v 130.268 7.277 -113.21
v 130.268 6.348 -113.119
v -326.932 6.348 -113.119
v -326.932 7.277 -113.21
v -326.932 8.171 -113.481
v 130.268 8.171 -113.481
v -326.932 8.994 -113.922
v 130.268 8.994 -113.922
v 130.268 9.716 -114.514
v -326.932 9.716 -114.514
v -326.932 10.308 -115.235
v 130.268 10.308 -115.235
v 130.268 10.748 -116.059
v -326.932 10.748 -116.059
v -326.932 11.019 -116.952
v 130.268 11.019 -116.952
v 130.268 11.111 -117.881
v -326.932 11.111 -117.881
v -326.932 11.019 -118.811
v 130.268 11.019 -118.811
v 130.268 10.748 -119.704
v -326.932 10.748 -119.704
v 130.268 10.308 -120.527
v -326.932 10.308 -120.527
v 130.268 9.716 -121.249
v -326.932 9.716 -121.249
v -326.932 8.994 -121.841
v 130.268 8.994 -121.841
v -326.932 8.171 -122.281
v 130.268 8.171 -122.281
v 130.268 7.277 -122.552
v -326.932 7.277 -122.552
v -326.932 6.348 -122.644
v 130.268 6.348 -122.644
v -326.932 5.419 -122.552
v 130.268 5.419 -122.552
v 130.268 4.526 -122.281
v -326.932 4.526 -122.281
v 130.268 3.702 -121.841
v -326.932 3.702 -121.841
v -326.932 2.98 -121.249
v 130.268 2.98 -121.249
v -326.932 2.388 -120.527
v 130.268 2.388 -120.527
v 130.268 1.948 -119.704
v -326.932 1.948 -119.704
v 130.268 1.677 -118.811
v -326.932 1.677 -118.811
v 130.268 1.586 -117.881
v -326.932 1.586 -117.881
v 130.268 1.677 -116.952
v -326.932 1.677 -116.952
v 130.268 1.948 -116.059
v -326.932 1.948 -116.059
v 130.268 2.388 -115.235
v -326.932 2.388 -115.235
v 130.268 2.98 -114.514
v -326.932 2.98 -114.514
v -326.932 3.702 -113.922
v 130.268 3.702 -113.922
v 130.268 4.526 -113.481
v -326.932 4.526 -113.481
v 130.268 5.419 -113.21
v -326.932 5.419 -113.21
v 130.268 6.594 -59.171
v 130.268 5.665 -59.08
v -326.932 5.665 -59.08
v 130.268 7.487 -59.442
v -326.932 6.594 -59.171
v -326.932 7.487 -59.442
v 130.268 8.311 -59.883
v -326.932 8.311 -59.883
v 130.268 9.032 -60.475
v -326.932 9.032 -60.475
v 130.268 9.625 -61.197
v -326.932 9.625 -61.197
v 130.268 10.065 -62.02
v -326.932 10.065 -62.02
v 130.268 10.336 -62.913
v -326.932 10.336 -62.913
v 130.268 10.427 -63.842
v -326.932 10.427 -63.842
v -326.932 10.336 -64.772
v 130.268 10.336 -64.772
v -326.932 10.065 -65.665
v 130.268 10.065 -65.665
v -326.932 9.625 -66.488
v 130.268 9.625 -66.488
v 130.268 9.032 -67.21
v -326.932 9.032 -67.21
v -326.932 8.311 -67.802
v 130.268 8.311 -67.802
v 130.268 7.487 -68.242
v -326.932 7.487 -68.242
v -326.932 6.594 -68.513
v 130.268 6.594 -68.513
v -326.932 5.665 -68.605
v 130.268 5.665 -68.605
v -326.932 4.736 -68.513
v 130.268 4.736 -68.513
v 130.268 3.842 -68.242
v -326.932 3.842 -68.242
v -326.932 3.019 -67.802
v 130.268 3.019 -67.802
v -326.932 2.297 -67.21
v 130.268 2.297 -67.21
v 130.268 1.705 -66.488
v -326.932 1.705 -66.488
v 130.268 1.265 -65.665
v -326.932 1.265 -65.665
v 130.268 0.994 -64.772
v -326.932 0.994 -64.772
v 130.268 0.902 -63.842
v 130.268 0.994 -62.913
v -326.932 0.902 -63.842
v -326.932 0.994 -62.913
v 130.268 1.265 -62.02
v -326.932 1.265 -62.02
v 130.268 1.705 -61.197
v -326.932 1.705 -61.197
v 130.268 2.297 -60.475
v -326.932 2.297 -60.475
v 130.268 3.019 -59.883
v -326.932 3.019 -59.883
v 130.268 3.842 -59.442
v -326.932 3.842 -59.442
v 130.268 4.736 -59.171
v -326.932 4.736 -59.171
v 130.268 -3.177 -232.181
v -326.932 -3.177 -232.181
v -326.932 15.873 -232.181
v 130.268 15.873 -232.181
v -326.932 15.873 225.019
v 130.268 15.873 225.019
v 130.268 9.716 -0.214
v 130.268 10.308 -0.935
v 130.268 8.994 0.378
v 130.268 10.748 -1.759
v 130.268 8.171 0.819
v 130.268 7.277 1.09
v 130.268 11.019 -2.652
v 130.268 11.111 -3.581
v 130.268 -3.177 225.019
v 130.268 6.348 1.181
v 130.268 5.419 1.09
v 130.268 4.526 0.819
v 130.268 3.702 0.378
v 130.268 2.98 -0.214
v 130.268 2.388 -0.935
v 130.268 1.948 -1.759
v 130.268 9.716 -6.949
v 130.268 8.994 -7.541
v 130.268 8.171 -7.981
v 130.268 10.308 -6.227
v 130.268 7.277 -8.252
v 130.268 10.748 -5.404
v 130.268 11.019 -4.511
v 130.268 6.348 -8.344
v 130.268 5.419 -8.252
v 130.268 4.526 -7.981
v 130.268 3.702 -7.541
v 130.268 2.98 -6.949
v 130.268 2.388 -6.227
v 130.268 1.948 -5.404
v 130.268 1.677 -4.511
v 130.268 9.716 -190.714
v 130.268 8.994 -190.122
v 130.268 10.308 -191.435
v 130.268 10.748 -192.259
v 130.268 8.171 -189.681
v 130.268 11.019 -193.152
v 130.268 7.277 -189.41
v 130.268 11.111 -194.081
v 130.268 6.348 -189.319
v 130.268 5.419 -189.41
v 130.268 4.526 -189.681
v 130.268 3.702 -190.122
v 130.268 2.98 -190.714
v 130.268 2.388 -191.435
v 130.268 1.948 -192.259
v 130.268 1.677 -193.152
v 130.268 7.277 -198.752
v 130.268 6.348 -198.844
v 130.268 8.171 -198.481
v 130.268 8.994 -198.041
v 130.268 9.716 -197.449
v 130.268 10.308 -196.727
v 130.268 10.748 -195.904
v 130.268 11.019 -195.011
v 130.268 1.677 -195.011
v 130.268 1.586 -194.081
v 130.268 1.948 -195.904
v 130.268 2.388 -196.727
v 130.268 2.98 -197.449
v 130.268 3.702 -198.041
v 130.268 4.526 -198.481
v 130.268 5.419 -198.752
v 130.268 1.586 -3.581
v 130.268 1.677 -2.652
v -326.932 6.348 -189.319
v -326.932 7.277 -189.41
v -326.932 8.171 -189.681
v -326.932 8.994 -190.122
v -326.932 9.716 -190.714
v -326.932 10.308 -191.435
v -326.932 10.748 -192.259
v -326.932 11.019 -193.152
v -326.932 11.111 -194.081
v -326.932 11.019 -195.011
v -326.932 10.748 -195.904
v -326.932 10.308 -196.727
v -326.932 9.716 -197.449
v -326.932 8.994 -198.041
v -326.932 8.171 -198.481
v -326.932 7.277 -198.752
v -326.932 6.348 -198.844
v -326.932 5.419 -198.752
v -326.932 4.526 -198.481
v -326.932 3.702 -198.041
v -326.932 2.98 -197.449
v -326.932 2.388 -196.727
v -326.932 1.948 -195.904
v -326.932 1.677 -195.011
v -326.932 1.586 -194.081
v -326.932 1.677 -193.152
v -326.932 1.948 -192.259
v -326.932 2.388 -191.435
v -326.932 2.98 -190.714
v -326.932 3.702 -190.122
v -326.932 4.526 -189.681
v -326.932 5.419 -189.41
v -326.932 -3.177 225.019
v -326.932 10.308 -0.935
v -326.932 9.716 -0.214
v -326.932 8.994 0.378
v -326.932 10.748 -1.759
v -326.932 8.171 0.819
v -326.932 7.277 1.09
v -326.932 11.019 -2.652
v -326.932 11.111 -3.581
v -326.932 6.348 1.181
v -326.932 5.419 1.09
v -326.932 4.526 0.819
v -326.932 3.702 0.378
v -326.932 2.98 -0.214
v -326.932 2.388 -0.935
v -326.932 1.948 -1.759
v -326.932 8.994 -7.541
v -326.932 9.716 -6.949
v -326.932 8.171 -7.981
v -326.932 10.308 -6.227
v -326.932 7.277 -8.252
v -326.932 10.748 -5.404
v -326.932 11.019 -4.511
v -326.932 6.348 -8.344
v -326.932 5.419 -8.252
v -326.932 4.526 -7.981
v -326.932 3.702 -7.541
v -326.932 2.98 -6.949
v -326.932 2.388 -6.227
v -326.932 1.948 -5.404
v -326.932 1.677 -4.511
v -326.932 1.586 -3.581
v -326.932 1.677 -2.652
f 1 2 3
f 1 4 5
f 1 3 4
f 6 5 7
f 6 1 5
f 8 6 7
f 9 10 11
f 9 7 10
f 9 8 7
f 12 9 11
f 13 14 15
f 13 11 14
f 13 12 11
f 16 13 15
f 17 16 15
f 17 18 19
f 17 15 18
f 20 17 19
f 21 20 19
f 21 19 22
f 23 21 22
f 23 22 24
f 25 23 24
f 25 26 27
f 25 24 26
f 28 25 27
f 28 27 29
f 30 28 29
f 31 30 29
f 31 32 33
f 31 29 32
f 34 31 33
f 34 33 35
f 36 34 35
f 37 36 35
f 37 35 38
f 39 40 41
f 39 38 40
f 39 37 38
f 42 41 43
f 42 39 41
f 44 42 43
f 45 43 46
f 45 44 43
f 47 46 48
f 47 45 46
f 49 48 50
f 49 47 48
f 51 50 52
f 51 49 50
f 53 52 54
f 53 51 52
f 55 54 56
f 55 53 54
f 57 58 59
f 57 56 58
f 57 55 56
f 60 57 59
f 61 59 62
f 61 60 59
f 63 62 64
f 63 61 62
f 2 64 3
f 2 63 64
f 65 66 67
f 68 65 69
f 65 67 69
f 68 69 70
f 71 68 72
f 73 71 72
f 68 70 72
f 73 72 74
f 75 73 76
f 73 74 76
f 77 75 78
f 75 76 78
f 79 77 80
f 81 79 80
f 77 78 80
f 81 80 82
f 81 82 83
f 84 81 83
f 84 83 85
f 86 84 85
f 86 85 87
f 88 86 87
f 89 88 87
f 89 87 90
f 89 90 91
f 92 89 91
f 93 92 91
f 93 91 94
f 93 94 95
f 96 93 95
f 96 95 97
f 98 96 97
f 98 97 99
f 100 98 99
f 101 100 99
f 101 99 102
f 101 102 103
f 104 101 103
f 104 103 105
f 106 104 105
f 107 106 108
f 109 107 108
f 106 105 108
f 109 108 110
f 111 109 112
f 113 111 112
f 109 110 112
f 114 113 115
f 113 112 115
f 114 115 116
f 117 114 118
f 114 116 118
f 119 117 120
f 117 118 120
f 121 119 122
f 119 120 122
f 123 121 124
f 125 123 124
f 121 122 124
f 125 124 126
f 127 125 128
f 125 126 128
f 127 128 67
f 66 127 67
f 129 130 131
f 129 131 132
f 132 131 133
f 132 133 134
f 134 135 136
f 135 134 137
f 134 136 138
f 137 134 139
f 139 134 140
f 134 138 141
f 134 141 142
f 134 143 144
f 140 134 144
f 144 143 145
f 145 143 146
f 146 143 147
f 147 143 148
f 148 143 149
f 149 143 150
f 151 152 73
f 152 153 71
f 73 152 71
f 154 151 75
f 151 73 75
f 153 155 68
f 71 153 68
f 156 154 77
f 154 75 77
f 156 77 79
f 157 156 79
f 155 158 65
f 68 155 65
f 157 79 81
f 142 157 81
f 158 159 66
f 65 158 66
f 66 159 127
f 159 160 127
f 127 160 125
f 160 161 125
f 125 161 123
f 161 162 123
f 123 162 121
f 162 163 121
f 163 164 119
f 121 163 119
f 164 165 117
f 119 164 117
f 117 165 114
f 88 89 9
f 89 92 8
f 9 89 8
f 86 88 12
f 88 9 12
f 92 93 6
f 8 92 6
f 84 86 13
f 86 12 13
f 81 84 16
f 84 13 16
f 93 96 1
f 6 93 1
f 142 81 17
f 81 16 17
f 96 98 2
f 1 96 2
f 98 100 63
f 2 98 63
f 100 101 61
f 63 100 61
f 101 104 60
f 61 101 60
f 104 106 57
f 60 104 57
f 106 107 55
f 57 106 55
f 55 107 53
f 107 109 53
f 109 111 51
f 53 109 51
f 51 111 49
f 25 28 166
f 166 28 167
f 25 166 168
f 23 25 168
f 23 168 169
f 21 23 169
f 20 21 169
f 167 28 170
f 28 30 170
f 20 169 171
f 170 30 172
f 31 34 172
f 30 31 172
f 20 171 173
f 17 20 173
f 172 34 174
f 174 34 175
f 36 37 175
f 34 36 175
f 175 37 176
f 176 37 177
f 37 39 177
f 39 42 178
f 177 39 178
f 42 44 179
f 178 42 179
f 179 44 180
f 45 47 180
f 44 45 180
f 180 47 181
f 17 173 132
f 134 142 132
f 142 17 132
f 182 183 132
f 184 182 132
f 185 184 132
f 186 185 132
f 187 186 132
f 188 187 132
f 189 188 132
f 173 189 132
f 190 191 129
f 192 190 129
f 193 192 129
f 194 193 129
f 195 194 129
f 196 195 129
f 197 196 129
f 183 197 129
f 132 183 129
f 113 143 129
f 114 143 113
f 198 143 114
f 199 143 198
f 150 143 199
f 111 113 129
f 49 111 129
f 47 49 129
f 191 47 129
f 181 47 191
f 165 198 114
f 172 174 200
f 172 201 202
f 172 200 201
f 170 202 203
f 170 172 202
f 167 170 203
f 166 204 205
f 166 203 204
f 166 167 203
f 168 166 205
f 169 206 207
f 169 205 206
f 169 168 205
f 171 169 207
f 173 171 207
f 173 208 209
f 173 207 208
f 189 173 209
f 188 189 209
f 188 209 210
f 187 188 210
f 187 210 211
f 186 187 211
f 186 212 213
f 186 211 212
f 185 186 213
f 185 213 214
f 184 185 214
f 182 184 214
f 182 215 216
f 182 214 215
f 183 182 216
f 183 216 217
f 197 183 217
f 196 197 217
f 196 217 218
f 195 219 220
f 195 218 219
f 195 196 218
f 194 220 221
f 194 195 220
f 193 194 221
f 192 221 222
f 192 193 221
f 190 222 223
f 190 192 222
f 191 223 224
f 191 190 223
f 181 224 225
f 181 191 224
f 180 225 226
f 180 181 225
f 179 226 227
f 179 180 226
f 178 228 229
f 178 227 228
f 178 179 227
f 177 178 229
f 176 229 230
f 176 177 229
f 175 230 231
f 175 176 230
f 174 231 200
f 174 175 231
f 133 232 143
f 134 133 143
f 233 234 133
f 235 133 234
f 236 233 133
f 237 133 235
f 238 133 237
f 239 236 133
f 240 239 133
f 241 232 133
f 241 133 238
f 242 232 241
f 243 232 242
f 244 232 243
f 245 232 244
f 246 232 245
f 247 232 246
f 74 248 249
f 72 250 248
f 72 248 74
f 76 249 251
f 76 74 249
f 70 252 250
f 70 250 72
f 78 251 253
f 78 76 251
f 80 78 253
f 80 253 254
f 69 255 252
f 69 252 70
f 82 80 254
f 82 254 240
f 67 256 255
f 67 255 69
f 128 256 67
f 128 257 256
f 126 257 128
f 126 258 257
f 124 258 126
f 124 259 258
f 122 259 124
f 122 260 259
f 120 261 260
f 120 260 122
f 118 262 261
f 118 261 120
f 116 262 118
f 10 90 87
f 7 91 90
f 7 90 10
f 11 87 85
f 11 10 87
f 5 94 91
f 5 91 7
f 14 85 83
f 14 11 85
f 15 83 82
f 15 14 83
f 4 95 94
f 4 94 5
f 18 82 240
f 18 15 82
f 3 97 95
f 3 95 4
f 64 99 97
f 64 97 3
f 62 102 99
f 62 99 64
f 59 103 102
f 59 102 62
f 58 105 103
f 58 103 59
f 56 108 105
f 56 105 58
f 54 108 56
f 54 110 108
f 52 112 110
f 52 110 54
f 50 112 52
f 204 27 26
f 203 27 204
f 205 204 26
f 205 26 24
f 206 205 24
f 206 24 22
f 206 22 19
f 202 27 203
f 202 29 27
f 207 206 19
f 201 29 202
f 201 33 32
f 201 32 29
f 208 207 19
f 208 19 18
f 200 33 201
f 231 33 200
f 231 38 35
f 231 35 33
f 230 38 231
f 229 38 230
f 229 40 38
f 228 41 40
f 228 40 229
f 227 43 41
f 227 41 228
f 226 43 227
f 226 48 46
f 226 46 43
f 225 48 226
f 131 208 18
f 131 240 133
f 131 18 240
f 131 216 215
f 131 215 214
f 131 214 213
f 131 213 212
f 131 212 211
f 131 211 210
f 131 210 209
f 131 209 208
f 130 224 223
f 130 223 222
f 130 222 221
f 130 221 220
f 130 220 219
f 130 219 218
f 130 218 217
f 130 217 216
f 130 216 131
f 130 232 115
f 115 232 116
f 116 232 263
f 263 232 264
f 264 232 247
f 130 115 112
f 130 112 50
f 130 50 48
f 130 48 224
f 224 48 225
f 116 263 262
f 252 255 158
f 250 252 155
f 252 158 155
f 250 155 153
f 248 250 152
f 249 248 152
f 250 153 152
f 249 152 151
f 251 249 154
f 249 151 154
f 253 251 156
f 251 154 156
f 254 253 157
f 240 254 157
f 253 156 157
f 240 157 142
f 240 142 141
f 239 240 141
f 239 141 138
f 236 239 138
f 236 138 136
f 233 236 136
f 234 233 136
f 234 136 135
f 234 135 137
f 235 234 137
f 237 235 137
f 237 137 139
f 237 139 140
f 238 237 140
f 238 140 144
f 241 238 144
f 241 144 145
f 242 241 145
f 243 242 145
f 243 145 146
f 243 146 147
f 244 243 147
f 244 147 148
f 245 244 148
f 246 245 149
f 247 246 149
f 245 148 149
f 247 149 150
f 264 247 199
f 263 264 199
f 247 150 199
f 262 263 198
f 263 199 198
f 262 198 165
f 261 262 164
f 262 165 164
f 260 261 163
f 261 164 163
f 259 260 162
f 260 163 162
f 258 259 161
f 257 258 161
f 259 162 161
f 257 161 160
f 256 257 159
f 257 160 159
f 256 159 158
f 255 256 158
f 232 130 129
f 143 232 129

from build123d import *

# Parameters (mm, degrees)
SKETCH2_W               = 304.8
SKETCH2_H               = 304.8
BOSS_EXTRUDE1_DEPTH     = 12.7
SKETCH3_R               = 3.175
CUT_EXTRUDE1_DEPTH      = 343.16151121
SKETCH4_R               = 3.175
CUT_EXTRUDE2_DEPTH      = 343.16151121
CUT_EXTRUDE7_DEPTH      = 343.16151121
CUT_EXTRUDE7_DEPTH_BACK = 343.16151121
SKETCH5_R               = 3.175
CUT_EXTRUDE8_DEPTH      = 343.16151121
CUT_EXTRUDE8_DEPTH_BACK = 343.16151121
SKETCH6_R               = 3.175
SCALE1_SCALE            = 1.5


with BuildPart() as part:
    # Sketch2 → Boss-Extrude1 (new body)
    with BuildSketch(Plane(origin=(0, 0, 0), x_dir=(1, 0, 0), z_dir=(0, 1, 0))):
        with Locations((-98.332011444, 2.55215311)):
            Rectangle(SKETCH2_W, SKETCH2_H)
    extrude(amount=BOSS_EXTRUDE1_DEPTH)

    # Sketch3 → Cut-Extrude1 (cut, through all)
    with BuildSketch(Plane(origin=(54.067988556, 0, 0), x_dir=(0, 0, -1), z_dir=(1, 0, 0))):
        with Locations((2.55215311, 6.35)):
            Circle(SKETCH3_R)
    extrude(amount=-CUT_EXTRUDE1_DEPTH, mode=Mode.SUBTRACT)

    # Sketch4 → Cut-Extrude2 (cut, through all)
    with BuildSketch(Plane.ZY.offset(250.732011444)):
        with Locations((-42.726167629, 5.894382634)):
            Circle(SKETCH4_R)
    extrude(amount=-CUT_EXTRUDE2_DEPTH, mode=Mode.SUBTRACT)

    # Sketch5 → Cut-Extrude7 (cut, two sides: drawn at the far end of the back side and taken through both)
    with BuildSketch(Plane.ZY.offset(250.732011444).offset(-CUT_EXTRUDE7_DEPTH_BACK)):
        with Locations((-78.75215311, 6.35)):
            Circle(SKETCH5_R)
    extrude(amount=CUT_EXTRUDE7_DEPTH + CUT_EXTRUDE7_DEPTH_BACK, mode=Mode.SUBTRACT)

    # Sketch6 → Cut-Extrude8 (cut, two sides: drawn at the far end of the back side and taken through both)
    with BuildSketch(Plane.ZY.offset(250.732011444).offset(-CUT_EXTRUDE8_DEPTH_BACK)):
        with Locations((-129.55215311, 6.35)):
            Circle(SKETCH6_R)
    extrude(amount=CUT_EXTRUDE8_DEPTH + CUT_EXTRUDE8_DEPTH_BACK, mode=Mode.SUBTRACT)


with BuildPart() as part_1:
    # Scale1: scaled about (-98.332011444, 6.35385362, -0.493691098)
    add(part.part.scale(SCALE1_SCALE).moved(Location((49.166005722, -3.17692681, 0.246845549))))


solid = part_1.part
